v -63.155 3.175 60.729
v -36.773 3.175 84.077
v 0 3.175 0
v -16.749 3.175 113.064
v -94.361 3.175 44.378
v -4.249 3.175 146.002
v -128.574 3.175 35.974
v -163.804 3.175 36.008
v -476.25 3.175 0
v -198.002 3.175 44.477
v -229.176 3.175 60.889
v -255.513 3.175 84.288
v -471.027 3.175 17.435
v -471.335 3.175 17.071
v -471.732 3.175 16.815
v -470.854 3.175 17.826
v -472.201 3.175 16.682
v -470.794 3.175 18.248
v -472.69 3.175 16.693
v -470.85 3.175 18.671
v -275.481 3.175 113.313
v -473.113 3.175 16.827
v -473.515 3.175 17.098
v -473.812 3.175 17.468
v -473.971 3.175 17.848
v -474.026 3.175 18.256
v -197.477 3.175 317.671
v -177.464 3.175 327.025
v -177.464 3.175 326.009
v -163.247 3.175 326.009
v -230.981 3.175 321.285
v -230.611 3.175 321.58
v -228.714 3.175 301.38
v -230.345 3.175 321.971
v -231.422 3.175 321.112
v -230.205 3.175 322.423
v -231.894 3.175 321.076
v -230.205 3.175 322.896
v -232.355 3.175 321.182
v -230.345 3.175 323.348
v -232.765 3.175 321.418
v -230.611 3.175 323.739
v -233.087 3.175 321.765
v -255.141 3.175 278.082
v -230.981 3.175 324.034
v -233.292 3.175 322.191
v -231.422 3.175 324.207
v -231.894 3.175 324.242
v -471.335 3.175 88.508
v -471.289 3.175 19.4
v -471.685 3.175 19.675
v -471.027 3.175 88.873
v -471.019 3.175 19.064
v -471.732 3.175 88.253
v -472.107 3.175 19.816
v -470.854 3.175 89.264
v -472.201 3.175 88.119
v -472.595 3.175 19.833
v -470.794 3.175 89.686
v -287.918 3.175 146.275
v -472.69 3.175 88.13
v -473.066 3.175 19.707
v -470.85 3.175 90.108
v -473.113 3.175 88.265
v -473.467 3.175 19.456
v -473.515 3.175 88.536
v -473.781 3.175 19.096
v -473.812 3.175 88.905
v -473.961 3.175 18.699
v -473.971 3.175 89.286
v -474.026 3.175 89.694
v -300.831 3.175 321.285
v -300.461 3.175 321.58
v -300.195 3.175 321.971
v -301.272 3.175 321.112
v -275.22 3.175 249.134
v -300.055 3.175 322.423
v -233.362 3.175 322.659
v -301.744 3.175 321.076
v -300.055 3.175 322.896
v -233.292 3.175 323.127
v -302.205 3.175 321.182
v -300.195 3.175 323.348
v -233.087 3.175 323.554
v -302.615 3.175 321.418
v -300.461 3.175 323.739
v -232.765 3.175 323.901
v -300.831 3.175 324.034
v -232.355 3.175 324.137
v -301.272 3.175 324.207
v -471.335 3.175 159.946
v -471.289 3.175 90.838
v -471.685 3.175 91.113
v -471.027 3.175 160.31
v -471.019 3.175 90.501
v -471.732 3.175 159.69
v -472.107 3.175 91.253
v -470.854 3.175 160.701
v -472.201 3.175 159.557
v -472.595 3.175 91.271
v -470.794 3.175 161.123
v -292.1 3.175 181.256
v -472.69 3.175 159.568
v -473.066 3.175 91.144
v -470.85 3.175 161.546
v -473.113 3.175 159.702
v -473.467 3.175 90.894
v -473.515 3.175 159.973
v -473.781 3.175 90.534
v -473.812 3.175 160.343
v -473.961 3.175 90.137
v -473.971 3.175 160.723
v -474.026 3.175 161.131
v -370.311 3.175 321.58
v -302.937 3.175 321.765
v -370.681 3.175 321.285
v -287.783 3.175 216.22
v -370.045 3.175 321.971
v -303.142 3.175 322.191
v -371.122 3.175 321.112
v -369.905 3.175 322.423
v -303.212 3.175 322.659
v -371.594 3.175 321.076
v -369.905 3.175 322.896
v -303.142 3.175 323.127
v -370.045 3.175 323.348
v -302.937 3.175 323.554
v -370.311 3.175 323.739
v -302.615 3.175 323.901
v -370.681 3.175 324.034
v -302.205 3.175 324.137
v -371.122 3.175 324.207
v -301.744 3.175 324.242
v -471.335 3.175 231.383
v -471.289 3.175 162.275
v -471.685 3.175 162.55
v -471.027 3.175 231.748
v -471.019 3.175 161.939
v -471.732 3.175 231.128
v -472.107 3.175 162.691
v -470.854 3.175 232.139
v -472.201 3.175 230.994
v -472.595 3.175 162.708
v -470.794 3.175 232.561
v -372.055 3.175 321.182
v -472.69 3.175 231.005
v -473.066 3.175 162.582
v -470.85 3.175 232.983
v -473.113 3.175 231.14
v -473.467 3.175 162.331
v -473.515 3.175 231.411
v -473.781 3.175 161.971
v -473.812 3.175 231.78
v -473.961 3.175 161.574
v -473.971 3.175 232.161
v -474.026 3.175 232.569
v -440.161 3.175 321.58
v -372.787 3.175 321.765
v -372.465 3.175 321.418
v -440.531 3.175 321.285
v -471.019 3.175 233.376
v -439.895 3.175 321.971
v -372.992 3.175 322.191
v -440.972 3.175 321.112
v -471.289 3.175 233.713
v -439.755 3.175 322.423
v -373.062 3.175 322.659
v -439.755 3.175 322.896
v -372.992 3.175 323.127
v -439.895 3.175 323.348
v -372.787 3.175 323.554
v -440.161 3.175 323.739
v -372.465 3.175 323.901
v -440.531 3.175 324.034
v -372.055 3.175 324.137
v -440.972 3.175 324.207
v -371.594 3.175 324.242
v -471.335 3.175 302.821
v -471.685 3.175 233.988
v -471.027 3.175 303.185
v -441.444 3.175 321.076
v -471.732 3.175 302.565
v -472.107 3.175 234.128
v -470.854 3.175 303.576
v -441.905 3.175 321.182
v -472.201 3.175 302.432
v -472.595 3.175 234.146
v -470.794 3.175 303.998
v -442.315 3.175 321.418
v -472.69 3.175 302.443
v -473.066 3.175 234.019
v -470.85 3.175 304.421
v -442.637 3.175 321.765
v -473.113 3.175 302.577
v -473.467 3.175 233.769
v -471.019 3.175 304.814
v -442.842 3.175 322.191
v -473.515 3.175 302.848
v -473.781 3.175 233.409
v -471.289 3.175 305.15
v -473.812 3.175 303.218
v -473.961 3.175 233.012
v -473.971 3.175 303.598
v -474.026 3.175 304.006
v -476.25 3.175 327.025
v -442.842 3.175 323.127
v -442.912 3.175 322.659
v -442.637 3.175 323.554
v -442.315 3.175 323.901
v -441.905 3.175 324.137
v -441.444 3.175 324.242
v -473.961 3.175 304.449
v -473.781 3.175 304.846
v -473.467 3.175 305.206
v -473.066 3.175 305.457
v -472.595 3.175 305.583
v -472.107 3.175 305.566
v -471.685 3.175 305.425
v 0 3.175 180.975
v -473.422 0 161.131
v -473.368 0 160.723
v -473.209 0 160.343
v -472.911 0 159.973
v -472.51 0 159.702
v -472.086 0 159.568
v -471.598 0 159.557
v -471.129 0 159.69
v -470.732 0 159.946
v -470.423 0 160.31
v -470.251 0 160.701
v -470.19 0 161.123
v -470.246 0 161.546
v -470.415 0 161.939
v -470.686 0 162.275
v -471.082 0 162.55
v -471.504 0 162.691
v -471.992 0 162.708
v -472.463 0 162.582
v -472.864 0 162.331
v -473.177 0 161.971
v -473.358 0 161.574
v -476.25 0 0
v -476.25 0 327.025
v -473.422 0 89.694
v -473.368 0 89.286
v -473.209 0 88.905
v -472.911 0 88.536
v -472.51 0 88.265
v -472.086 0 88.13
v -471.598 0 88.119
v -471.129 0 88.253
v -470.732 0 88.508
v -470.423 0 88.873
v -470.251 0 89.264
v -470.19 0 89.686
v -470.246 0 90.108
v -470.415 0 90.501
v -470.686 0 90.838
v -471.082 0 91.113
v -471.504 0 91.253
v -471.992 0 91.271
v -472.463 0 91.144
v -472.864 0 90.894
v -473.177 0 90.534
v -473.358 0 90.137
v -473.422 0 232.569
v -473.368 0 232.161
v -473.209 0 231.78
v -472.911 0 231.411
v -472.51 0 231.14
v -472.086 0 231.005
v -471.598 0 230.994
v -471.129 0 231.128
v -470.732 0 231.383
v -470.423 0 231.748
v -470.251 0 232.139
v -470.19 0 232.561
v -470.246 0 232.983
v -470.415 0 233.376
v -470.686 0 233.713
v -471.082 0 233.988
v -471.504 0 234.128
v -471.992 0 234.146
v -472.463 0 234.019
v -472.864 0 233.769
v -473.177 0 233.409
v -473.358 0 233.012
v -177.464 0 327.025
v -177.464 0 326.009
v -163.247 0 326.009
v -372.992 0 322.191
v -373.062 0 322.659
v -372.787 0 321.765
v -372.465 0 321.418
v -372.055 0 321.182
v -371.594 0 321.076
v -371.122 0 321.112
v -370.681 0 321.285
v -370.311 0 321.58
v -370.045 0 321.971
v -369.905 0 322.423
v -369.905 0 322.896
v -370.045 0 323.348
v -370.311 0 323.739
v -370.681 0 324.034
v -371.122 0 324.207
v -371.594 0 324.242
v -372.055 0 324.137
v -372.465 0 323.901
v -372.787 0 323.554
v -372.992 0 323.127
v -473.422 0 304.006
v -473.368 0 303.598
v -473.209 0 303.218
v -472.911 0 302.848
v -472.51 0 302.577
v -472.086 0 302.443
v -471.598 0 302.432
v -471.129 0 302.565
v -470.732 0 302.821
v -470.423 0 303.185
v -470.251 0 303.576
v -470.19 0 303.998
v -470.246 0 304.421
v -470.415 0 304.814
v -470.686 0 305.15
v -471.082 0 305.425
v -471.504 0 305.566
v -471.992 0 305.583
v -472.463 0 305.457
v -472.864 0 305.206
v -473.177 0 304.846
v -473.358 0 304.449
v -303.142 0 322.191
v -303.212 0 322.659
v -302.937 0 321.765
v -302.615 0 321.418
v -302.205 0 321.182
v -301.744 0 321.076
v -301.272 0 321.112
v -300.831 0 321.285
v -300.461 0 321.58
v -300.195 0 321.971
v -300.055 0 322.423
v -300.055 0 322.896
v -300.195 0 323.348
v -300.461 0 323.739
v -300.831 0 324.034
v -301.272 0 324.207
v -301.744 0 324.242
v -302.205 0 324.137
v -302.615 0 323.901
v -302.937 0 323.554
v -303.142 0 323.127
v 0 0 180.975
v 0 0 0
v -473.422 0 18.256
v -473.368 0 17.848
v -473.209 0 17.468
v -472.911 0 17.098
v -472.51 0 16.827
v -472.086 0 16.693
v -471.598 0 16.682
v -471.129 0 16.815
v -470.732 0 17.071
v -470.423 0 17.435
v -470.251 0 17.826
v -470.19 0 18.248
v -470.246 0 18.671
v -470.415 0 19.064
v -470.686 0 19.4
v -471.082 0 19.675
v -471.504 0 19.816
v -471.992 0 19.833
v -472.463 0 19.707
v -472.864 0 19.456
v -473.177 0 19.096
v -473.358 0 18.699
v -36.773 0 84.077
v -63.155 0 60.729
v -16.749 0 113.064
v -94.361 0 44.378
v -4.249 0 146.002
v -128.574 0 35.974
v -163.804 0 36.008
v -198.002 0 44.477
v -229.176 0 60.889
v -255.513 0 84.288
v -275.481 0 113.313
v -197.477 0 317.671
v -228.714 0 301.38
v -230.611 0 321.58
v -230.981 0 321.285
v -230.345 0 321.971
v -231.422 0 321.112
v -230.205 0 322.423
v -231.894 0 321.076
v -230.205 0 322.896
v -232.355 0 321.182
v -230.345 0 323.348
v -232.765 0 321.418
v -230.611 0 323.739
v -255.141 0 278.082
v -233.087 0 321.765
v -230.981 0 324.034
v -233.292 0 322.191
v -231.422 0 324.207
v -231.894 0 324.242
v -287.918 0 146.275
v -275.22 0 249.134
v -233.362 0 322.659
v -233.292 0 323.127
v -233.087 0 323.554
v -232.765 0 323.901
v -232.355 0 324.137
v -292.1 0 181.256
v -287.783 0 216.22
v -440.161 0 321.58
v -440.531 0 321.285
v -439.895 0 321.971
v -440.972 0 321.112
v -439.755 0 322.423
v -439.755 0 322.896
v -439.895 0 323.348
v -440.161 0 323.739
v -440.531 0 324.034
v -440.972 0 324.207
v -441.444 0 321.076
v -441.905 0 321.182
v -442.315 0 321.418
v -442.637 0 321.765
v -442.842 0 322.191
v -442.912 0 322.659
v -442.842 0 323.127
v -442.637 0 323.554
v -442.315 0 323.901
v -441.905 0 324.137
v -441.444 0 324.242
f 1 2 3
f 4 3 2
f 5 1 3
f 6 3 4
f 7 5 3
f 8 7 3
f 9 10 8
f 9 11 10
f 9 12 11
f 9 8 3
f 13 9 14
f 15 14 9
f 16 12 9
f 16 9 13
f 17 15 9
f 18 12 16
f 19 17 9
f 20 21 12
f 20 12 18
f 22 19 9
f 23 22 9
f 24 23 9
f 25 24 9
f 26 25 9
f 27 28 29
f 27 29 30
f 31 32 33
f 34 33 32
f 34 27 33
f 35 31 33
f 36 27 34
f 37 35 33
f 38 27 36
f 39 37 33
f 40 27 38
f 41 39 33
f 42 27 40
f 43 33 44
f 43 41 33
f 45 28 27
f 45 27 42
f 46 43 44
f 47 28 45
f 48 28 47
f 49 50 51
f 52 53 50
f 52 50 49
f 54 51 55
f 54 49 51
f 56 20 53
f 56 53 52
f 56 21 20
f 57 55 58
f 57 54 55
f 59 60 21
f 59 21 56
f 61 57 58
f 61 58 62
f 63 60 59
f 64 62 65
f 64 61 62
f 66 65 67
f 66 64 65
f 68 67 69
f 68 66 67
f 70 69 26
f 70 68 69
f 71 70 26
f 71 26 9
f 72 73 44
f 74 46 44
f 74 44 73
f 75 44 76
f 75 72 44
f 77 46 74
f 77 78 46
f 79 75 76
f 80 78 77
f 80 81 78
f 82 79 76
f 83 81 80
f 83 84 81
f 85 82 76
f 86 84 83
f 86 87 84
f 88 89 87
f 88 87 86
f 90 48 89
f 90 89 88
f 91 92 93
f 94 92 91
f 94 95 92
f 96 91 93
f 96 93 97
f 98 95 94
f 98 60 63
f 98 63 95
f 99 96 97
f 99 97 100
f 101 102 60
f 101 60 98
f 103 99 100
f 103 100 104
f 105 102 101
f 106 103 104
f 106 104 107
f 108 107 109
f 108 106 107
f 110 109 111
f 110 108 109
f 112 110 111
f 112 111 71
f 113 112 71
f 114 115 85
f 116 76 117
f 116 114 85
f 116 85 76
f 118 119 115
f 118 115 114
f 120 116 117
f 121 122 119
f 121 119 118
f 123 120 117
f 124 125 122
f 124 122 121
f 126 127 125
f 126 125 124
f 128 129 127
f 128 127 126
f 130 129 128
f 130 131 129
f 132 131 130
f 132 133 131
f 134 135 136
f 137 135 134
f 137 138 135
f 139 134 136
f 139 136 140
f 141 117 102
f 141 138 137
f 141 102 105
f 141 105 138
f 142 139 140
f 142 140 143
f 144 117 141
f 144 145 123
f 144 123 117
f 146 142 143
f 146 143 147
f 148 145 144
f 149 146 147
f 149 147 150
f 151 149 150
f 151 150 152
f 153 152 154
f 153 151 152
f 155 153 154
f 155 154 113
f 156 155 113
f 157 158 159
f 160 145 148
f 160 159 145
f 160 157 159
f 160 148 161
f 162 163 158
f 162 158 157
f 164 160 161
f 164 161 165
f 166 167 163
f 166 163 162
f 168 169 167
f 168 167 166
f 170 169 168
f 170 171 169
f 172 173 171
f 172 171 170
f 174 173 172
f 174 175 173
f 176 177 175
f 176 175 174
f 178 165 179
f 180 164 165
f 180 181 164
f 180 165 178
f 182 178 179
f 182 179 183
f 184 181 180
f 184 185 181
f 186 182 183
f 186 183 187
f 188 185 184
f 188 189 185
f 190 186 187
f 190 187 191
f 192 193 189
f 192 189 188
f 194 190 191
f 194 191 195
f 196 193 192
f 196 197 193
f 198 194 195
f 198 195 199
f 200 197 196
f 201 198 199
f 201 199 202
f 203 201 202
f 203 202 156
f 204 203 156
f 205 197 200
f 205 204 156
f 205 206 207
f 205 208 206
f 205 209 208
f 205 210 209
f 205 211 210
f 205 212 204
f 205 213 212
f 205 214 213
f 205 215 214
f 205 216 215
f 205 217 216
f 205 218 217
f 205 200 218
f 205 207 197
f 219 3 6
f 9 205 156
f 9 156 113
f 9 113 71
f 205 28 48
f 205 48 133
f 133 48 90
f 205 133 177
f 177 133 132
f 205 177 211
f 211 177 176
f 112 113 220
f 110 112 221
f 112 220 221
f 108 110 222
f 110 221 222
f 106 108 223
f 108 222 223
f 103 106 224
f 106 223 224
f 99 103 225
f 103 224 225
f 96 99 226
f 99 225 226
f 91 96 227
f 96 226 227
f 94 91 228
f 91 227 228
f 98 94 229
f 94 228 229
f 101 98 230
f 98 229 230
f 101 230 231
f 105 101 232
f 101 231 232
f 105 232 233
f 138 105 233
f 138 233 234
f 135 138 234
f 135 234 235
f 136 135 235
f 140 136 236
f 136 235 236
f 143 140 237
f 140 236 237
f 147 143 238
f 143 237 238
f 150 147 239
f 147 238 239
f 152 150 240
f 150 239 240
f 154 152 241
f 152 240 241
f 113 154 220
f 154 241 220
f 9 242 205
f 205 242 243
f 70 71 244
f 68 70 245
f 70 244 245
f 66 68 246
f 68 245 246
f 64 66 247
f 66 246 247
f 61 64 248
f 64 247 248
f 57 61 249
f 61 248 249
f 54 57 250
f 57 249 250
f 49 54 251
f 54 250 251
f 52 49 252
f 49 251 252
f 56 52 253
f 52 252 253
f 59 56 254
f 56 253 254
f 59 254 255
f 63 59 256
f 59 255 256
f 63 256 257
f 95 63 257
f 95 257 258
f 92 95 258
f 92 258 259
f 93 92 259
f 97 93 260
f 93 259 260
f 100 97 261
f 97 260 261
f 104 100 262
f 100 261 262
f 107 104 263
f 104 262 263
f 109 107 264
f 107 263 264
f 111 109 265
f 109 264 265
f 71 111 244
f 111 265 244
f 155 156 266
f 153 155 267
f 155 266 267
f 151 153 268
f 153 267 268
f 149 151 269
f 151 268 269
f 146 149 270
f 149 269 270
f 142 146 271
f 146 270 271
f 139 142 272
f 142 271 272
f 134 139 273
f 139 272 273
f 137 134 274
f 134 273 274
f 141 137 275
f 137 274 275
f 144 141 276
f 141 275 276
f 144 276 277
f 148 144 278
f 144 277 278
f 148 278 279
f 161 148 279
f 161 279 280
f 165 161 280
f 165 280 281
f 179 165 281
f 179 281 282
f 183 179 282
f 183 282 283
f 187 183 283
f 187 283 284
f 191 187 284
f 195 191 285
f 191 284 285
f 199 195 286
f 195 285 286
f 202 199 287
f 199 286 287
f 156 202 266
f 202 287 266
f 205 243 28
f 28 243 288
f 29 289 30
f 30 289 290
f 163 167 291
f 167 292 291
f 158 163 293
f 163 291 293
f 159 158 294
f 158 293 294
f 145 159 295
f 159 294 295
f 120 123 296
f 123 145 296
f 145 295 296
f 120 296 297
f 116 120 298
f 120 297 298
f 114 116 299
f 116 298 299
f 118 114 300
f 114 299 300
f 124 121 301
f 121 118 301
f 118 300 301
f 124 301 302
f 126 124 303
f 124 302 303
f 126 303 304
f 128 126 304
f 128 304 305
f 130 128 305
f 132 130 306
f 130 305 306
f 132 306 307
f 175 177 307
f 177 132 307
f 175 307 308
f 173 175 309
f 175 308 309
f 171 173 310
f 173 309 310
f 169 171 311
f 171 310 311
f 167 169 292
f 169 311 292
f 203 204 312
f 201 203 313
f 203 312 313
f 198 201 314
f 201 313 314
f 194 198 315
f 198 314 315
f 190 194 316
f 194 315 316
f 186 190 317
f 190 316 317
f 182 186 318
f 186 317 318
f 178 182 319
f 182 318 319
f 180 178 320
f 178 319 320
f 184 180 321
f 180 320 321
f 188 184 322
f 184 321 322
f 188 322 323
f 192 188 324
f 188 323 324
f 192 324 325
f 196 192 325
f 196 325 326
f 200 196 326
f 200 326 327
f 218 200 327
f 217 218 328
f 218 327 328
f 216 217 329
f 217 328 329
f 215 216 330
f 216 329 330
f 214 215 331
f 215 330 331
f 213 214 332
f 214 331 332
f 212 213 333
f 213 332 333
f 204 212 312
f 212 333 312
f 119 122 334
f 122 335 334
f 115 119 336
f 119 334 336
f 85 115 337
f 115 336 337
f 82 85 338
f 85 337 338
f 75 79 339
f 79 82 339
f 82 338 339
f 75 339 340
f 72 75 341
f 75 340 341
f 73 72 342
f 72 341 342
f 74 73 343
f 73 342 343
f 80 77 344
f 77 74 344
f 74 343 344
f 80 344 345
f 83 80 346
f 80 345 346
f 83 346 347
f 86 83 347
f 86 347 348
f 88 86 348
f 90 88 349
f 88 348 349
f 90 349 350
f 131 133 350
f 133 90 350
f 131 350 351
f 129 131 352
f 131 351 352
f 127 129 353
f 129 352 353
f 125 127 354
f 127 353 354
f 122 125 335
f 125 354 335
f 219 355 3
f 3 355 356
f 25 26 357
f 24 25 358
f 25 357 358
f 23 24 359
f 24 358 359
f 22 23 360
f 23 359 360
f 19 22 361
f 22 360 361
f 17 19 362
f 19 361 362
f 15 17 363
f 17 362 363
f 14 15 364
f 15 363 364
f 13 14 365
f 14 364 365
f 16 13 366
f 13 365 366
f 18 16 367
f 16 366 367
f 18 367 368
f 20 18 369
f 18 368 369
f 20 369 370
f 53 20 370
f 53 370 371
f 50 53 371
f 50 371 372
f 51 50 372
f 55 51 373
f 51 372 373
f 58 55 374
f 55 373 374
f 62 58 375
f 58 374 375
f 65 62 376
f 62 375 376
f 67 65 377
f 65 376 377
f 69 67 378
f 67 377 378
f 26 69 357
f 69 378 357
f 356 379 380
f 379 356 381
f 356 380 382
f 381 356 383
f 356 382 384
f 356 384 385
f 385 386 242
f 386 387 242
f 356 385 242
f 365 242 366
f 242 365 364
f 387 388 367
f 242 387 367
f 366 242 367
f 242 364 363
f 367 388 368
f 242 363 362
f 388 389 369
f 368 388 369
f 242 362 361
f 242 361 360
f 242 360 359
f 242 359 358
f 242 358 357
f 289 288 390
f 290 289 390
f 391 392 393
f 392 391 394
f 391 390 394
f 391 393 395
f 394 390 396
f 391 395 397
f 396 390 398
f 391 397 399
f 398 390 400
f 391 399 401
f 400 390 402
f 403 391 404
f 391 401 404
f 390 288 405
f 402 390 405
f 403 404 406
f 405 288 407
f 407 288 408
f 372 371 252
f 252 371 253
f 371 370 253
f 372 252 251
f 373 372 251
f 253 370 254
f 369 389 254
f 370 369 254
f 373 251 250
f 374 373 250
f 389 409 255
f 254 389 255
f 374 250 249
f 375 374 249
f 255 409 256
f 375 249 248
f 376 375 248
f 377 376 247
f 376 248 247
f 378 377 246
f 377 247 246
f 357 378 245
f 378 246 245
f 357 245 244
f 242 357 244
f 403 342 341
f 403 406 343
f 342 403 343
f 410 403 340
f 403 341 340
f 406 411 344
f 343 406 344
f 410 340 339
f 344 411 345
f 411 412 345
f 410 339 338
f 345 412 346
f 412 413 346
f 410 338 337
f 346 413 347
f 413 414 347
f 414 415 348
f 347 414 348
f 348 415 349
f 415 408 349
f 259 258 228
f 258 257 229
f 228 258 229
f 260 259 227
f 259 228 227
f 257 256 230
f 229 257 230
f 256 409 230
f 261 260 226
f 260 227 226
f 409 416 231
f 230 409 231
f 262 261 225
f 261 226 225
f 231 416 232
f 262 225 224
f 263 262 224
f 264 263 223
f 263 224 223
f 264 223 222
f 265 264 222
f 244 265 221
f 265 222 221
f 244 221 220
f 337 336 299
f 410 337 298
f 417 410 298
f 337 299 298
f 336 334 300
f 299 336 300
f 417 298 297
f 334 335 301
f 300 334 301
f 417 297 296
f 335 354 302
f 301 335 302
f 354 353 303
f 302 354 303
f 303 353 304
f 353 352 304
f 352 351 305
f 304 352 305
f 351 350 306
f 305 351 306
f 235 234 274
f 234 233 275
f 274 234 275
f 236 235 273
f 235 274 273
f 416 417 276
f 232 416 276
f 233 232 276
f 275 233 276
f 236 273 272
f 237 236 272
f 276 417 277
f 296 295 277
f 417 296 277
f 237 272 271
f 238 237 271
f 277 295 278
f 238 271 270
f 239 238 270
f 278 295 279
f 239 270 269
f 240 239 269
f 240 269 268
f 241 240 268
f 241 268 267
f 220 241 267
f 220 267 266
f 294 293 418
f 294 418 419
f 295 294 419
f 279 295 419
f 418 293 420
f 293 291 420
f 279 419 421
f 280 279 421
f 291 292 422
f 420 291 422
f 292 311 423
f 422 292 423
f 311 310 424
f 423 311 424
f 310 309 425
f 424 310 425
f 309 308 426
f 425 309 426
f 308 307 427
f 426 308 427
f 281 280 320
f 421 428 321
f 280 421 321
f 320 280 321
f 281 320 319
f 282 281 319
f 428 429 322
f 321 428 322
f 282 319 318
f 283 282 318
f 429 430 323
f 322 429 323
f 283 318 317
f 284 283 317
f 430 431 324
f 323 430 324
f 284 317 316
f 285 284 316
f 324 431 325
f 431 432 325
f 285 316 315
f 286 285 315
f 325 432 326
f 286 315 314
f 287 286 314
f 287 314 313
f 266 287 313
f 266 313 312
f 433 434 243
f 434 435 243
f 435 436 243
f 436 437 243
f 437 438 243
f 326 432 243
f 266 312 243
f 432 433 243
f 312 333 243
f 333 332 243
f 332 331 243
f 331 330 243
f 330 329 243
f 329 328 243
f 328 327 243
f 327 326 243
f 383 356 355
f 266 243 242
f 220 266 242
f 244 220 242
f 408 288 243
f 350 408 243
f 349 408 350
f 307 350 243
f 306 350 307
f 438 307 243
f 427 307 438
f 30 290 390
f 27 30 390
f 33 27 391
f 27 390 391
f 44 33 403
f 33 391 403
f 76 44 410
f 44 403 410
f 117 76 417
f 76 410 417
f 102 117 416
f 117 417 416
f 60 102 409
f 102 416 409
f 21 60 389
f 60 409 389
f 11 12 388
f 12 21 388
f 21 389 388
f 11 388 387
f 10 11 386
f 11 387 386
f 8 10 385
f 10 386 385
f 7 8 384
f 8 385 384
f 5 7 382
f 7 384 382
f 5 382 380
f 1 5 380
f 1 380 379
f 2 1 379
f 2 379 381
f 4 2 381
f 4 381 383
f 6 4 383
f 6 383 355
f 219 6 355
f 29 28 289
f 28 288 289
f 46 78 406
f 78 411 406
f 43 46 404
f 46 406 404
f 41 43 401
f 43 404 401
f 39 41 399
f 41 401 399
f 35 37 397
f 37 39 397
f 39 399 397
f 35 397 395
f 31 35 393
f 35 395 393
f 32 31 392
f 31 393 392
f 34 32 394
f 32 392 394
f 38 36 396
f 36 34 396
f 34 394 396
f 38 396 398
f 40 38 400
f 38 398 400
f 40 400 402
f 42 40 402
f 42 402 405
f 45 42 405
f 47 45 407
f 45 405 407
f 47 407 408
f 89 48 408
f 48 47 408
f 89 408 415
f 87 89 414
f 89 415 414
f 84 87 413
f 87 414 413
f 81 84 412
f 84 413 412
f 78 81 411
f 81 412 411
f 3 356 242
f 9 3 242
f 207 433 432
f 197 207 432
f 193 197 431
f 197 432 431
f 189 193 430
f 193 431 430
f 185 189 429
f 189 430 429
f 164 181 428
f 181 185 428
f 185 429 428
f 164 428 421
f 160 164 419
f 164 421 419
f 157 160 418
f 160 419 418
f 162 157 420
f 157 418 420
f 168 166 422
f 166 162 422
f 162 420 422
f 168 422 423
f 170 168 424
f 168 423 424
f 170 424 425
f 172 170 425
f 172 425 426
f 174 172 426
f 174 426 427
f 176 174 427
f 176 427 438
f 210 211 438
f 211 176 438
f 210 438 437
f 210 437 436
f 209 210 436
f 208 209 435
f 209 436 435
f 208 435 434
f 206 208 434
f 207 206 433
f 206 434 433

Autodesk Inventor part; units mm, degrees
ref_plane "YZ Plane" through (0, 0, 0) normal (1, 0, 0) x (0, 1, 0)
ref_plane "XZ Plane" through (0, 0, 0) normal (0, 1, 0) x (-1, 0, 0)
sketch "Sketch1" plane through (0, 0, 0) normal (0, 1, 0) x (-1, 0, 0)
  arc A0 (0, 180.975) -> (146.05, 327.025) centre (146.05, 180.975) ccw
  line L0 (0, 180.975) -> (0, 0)
  line L1 (0, 0) -> (476.25, 0)
  line L2 (476.25, 0) -> (476.25, 327.025)
  line L3 (476.25, 327.025) -> (146.05, 327.025)
  circle A1 centre (301.625, 322.6594) radius 1.5875 projected
  circle A2 centre (441.325, 322.6594) radius 1.5875 projected
  circle A3 centre (371.475, 322.6594) radius 1.5875 projected
  circle A4 centre (231.775, 322.6594) radius 1.5875 projected
  line L4 (450.85, 330.2) -> (450.85, 315.1187) construction
  line L5 (450.85, 330.2) -> (222.25, 330.2) construction
  line L6 (222.25, 315.1187) -> (222.25, 330.2) construction
  line L7 (450.85, 315.1187) -> (222.25, 315.1187) construction
  line L8 (152.5101, 326.2312) -> (152.5101, 327.025) construction
  line L9 (152.5101, 326.2312) -> (177.4637, 326.2312) construction
  line L10 (177.4637, 327.025) -> (177.4637, 326.2312) construction
  line L11 (152.5101, 327.025) -> (177.4637, 327.025) construction
  line L12 (177.4637, 327.025) -> (177.4637, 326.009)
  line L13 (177.4637, 326.009) -> (163.2471, 326.009)
  arc A5 (163.2471, 326.009) -> (146.05, 327.025) centre (146.05, 180.975) ccw
  line L14 (146.05, 327.025) -> (177.4637, 327.025)
  dimension "d0" = 327.025
  dimension "d1" = 330.2
  dimension "d2" = 476.25
  dimension "d3" = 146.05
  dimension "d4" = 180.975
  dimension "d9" = 1.016
extrude "Extrusion1" add sketch "Sketch1" along normal blind 3.175 contours A0 L13 L12 L3 L2 L1 L0
ref_plane "Work Plane1" through (-464.1307, 0, 8.7312) normal (-0.1867, 0.9824, 0) x (-0.9824, -0.1867, 0)
sketch "Sketch2" plane through (-464.1307, 0, 8.7312) normal (-0.1867, 0.9824, 0) x (-0.9824, -0.1867, 0)
  circle A0 centre (7.5406, 223.8375) radius 1.5875 projected
  circle A1 centre (7.5406, 80.9625) radius 1.5875 projected
  circle A2 centre (7.5406, 9.525) radius 1.5875 projected
  circle A3 centre (7.5406, 152.4) radius 1.5875 projected
  circle A4 centre (7.5406, 295.275) radius 1.5875 projected
  line L0 (15.0813, 0) -> (0, 0) construction
  line L1 (15.0813, 0) -> (15.0813, 304.8) construction
  line L2 (0, 304.8) -> (15.0813, 304.8) construction
  line L3 (0, 0) -> (0, 304.8) construction
  point P0 (-455.9729, -8.7312)
extrude "Extrusion2" cut sketch "Sketch2" along normal through all
properties part number "Hopper Bottom" material "Polycarbonate, Clear"
